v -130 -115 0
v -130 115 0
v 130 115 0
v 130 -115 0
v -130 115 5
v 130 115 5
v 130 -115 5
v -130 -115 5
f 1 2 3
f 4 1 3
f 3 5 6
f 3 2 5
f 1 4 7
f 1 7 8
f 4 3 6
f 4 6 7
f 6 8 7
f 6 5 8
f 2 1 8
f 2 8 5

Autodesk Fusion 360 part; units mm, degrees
sketch "Sketch1" plane through (0, 0, 0) normal (0, 0, 1) x (1, 0, 0)
  line L0 (115.3, 31.25) -> (-115.3, 31.25)
  line L1 (-115.3, 31.25) -> (-115.3, -31.25)
  line L2 (-115.3, -31.25) -> (115.3, -31.25)
  line L3 (115.3, -31.25) -> (115.3, 31.25)
  line L4 (115.3, 31.25) -> (-115.3, -31.25) construction
  line L5 (-115.3, 31.25) -> (115.3, -31.25) construction
  dimension "d1" = 230.6
  dimension "d2" = 62.5
extrude "Extrude1" add sketch "Sketch1" along normal blind 5

Autodesk Fusion 360 part; units mm, degrees
sketch "Sketch1" plane through (0, 0, 0) normal (0, 0, 1) x (1, 0, 0)
  line L0 (135, -31.25) -> (-135, -31.25)
  line L1 (-135, -31.25) -> (-135, 31.25)
  line L2 (-135, 31.25) -> (135, 31.25)
  line L3 (135, 31.25) -> (135, -31.25)
  line L4 (135, -31.25) -> (-135, 31.25) construction
  line L5 (-135, -31.25) -> (135, 31.25) construction
  line L6 (-135, -31.25) -> (-145.5, -31.25)
  line L7 (-135, 31.25) -> (-145.5, -31.25)
  line L8 (135, -31.25) -> (145.5, -31.25)
  line L9 (135, 31.25) -> (145.5, -31.25)
  dimension "d1" = 62.5
  dimension "d2" = 270
  dimension "d5" = 10.5
  dimension "d6" = 10.5
extrude "Extrude1" add sketch "Sketch1" along normal blind 5

Autodesk Fusion 360 part; units mm, degrees
sketch "Sketch1" plane through (0, 0, 0) normal (0, 0, 1) x (1, 0, 0)
  line L0 (130, -115) -> (-130, -115)
  line L1 (-130, -115) -> (-130, 115)
  line L2 (-130, 115) -> (130, 115)
  line L3 (130, 115) -> (130, -115)
  line L4 (130, -115) -> (-130, 115) construction
  line L5 (-130, -115) -> (130, 115) construction
  dimension "d1" = 260
  dimension "d2" = 230
extrude "Extrude1" add sketch "Sketch1" along normal blind 5
